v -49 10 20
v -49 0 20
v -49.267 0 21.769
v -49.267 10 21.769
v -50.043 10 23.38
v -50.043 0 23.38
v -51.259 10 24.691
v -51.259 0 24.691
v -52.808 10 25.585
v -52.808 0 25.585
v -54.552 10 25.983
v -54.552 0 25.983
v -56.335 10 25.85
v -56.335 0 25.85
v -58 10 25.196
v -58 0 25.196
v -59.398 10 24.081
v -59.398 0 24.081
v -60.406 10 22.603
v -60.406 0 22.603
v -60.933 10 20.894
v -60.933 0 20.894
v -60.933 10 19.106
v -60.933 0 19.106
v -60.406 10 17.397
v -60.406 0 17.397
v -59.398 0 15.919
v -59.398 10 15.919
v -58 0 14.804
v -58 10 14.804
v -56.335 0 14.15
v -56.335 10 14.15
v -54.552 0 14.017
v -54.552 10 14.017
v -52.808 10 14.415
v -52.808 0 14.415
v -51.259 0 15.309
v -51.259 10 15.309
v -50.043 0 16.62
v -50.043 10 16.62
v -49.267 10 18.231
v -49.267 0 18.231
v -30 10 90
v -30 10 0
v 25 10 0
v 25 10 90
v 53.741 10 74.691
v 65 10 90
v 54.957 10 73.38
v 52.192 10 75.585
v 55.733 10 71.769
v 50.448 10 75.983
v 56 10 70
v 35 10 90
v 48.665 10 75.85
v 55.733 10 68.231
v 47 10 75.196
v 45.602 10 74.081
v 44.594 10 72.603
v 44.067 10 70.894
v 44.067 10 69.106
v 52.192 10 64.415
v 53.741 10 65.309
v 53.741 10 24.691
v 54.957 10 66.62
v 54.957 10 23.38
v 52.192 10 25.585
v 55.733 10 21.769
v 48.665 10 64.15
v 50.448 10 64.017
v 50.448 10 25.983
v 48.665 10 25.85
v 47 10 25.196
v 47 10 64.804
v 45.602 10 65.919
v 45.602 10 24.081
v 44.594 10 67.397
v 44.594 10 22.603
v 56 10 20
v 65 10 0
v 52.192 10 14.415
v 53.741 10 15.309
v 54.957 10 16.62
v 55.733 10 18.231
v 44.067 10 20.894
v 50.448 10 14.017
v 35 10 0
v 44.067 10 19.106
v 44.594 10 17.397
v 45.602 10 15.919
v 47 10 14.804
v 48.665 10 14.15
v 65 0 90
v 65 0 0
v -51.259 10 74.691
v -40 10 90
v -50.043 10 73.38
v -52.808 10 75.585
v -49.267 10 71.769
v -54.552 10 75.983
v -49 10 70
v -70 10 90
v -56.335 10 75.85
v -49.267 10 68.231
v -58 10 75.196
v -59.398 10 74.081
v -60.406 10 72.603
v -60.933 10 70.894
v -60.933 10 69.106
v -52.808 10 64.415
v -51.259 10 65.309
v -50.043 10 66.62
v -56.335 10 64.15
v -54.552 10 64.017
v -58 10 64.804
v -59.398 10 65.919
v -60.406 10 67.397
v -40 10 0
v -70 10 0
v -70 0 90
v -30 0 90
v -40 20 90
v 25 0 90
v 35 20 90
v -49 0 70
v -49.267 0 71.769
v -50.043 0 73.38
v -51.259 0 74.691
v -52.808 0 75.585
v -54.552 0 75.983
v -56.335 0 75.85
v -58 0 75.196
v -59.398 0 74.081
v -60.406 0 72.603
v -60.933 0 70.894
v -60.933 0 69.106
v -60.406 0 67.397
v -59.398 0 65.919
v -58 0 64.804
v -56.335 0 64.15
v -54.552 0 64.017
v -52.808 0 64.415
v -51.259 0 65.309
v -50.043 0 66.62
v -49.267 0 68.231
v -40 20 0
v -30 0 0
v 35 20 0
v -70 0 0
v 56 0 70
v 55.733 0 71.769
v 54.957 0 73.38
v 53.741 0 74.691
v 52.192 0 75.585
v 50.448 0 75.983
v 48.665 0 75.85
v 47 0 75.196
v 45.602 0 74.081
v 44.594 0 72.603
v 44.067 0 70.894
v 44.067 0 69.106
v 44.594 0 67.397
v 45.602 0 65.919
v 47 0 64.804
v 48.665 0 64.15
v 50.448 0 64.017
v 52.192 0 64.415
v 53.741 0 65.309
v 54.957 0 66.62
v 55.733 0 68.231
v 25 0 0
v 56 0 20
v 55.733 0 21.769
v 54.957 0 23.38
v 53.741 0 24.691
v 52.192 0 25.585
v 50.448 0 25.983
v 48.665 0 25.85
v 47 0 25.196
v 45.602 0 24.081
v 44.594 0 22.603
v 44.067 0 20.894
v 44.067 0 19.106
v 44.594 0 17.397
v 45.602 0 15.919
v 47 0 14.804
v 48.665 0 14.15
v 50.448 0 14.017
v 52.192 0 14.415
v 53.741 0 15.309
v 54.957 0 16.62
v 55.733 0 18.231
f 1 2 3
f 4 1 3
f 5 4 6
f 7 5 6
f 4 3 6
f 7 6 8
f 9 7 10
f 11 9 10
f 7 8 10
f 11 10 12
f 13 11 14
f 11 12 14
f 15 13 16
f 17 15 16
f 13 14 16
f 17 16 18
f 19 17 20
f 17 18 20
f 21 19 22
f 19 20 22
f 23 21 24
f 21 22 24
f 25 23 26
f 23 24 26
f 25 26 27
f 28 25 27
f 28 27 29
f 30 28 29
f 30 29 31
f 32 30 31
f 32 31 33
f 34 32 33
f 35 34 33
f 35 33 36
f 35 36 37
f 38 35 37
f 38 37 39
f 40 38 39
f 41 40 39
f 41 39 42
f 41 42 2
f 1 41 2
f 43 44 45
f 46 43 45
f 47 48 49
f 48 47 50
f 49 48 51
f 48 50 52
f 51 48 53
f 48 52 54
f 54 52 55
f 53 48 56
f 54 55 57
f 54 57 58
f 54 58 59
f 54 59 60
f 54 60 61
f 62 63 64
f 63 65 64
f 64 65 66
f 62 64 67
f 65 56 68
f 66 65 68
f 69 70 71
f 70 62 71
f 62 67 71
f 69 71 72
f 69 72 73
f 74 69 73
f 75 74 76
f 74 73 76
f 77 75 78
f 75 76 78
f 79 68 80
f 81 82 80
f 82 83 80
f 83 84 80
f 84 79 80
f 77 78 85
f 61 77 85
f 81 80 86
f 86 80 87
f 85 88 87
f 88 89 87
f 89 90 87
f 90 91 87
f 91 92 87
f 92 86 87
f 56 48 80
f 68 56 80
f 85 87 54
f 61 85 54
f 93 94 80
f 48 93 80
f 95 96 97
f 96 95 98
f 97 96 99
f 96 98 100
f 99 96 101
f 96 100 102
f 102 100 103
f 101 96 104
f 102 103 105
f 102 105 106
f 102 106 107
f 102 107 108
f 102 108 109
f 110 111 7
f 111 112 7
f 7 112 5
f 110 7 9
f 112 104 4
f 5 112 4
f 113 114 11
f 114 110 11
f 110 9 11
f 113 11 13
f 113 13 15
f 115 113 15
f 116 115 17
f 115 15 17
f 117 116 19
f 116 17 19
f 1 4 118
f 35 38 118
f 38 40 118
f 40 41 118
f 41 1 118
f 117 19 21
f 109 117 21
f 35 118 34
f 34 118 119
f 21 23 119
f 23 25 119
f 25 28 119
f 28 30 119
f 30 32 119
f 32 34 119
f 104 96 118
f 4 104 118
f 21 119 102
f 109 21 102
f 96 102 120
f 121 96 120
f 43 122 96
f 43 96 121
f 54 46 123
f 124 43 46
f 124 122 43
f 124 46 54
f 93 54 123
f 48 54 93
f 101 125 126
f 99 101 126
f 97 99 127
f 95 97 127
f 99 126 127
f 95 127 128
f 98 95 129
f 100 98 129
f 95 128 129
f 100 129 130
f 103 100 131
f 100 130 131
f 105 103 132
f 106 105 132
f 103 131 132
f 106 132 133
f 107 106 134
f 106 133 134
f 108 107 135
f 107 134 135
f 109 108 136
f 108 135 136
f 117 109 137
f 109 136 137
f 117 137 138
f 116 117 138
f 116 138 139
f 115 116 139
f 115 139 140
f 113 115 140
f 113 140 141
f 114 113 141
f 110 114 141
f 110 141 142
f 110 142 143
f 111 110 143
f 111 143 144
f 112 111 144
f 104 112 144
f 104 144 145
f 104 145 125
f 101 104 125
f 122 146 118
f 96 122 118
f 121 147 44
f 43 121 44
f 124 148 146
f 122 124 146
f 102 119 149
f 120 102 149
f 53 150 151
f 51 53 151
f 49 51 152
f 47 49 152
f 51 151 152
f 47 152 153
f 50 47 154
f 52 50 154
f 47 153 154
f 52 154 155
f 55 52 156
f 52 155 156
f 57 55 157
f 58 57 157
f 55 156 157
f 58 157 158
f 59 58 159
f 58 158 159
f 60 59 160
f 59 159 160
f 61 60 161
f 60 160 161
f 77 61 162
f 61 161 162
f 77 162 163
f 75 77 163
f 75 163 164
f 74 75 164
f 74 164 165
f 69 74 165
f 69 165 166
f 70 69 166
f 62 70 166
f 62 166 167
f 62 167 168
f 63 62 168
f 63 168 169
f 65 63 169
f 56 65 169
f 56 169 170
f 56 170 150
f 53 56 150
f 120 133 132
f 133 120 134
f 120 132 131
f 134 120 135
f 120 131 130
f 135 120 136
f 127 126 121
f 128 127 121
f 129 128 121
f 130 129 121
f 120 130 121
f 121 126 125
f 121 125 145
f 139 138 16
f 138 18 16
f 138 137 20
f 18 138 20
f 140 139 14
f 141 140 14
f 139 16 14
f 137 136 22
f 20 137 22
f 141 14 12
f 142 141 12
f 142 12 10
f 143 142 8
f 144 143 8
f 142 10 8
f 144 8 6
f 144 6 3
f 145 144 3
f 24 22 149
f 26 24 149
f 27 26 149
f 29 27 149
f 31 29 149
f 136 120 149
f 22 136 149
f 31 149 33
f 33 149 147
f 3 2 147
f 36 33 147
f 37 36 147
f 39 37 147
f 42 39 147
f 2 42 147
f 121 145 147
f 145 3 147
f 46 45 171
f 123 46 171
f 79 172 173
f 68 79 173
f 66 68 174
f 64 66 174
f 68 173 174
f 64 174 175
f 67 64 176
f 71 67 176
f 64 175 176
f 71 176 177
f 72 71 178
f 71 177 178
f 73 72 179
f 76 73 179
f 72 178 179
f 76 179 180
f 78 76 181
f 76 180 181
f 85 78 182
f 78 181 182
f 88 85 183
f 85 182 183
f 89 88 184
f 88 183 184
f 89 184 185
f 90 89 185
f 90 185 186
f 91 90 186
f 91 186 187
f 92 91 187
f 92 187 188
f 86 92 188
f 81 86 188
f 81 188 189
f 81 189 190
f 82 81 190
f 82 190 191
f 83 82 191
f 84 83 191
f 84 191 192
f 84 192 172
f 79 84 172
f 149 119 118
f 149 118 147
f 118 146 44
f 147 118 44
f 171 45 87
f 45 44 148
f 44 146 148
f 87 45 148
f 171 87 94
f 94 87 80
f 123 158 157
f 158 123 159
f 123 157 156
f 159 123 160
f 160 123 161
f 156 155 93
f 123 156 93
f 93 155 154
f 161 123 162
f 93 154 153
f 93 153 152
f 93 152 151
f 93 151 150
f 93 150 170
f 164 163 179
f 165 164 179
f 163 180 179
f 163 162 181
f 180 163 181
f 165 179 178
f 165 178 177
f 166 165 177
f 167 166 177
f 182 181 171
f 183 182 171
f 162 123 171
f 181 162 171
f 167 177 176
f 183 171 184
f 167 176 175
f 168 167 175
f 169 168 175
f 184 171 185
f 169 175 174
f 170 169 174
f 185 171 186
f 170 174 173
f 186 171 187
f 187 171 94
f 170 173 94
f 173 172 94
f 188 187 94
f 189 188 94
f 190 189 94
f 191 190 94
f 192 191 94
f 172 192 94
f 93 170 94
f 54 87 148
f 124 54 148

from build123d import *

# Parameters (mm, degrees)
F1_DEPTH = 90
F2_R     = 6
F3_DEPTH = 20.001


with BuildPart() as f1:
    # F0 (on Top) → F1 (new body)
    with BuildSketch(Plane.XY):
        Polygon((-70, 10), (-70, 0), (-30, 0), (-30, 10), (25, 10), (25, 0), (65, 0), (65, 10), (35, 10), (35, 20), (-40, 20), (-40, 10), align=None)
    extrude(amount=F1_DEPTH)

    # F2 (on Front) → F3 (cut, through all)
    with BuildSketch(Plane.XZ):
        with Locations((-55, 20)):
            Circle(F2_R)
        with Locations((-55, 70)):
            Circle(F2_R)
        with Locations((50, 70)):
            Circle(F2_R)
        with Locations((50, 20)):
            Circle(F2_R)
    extrude(amount=-F3_DEPTH, mode=Mode.SUBTRACT)


solid = f1.part
